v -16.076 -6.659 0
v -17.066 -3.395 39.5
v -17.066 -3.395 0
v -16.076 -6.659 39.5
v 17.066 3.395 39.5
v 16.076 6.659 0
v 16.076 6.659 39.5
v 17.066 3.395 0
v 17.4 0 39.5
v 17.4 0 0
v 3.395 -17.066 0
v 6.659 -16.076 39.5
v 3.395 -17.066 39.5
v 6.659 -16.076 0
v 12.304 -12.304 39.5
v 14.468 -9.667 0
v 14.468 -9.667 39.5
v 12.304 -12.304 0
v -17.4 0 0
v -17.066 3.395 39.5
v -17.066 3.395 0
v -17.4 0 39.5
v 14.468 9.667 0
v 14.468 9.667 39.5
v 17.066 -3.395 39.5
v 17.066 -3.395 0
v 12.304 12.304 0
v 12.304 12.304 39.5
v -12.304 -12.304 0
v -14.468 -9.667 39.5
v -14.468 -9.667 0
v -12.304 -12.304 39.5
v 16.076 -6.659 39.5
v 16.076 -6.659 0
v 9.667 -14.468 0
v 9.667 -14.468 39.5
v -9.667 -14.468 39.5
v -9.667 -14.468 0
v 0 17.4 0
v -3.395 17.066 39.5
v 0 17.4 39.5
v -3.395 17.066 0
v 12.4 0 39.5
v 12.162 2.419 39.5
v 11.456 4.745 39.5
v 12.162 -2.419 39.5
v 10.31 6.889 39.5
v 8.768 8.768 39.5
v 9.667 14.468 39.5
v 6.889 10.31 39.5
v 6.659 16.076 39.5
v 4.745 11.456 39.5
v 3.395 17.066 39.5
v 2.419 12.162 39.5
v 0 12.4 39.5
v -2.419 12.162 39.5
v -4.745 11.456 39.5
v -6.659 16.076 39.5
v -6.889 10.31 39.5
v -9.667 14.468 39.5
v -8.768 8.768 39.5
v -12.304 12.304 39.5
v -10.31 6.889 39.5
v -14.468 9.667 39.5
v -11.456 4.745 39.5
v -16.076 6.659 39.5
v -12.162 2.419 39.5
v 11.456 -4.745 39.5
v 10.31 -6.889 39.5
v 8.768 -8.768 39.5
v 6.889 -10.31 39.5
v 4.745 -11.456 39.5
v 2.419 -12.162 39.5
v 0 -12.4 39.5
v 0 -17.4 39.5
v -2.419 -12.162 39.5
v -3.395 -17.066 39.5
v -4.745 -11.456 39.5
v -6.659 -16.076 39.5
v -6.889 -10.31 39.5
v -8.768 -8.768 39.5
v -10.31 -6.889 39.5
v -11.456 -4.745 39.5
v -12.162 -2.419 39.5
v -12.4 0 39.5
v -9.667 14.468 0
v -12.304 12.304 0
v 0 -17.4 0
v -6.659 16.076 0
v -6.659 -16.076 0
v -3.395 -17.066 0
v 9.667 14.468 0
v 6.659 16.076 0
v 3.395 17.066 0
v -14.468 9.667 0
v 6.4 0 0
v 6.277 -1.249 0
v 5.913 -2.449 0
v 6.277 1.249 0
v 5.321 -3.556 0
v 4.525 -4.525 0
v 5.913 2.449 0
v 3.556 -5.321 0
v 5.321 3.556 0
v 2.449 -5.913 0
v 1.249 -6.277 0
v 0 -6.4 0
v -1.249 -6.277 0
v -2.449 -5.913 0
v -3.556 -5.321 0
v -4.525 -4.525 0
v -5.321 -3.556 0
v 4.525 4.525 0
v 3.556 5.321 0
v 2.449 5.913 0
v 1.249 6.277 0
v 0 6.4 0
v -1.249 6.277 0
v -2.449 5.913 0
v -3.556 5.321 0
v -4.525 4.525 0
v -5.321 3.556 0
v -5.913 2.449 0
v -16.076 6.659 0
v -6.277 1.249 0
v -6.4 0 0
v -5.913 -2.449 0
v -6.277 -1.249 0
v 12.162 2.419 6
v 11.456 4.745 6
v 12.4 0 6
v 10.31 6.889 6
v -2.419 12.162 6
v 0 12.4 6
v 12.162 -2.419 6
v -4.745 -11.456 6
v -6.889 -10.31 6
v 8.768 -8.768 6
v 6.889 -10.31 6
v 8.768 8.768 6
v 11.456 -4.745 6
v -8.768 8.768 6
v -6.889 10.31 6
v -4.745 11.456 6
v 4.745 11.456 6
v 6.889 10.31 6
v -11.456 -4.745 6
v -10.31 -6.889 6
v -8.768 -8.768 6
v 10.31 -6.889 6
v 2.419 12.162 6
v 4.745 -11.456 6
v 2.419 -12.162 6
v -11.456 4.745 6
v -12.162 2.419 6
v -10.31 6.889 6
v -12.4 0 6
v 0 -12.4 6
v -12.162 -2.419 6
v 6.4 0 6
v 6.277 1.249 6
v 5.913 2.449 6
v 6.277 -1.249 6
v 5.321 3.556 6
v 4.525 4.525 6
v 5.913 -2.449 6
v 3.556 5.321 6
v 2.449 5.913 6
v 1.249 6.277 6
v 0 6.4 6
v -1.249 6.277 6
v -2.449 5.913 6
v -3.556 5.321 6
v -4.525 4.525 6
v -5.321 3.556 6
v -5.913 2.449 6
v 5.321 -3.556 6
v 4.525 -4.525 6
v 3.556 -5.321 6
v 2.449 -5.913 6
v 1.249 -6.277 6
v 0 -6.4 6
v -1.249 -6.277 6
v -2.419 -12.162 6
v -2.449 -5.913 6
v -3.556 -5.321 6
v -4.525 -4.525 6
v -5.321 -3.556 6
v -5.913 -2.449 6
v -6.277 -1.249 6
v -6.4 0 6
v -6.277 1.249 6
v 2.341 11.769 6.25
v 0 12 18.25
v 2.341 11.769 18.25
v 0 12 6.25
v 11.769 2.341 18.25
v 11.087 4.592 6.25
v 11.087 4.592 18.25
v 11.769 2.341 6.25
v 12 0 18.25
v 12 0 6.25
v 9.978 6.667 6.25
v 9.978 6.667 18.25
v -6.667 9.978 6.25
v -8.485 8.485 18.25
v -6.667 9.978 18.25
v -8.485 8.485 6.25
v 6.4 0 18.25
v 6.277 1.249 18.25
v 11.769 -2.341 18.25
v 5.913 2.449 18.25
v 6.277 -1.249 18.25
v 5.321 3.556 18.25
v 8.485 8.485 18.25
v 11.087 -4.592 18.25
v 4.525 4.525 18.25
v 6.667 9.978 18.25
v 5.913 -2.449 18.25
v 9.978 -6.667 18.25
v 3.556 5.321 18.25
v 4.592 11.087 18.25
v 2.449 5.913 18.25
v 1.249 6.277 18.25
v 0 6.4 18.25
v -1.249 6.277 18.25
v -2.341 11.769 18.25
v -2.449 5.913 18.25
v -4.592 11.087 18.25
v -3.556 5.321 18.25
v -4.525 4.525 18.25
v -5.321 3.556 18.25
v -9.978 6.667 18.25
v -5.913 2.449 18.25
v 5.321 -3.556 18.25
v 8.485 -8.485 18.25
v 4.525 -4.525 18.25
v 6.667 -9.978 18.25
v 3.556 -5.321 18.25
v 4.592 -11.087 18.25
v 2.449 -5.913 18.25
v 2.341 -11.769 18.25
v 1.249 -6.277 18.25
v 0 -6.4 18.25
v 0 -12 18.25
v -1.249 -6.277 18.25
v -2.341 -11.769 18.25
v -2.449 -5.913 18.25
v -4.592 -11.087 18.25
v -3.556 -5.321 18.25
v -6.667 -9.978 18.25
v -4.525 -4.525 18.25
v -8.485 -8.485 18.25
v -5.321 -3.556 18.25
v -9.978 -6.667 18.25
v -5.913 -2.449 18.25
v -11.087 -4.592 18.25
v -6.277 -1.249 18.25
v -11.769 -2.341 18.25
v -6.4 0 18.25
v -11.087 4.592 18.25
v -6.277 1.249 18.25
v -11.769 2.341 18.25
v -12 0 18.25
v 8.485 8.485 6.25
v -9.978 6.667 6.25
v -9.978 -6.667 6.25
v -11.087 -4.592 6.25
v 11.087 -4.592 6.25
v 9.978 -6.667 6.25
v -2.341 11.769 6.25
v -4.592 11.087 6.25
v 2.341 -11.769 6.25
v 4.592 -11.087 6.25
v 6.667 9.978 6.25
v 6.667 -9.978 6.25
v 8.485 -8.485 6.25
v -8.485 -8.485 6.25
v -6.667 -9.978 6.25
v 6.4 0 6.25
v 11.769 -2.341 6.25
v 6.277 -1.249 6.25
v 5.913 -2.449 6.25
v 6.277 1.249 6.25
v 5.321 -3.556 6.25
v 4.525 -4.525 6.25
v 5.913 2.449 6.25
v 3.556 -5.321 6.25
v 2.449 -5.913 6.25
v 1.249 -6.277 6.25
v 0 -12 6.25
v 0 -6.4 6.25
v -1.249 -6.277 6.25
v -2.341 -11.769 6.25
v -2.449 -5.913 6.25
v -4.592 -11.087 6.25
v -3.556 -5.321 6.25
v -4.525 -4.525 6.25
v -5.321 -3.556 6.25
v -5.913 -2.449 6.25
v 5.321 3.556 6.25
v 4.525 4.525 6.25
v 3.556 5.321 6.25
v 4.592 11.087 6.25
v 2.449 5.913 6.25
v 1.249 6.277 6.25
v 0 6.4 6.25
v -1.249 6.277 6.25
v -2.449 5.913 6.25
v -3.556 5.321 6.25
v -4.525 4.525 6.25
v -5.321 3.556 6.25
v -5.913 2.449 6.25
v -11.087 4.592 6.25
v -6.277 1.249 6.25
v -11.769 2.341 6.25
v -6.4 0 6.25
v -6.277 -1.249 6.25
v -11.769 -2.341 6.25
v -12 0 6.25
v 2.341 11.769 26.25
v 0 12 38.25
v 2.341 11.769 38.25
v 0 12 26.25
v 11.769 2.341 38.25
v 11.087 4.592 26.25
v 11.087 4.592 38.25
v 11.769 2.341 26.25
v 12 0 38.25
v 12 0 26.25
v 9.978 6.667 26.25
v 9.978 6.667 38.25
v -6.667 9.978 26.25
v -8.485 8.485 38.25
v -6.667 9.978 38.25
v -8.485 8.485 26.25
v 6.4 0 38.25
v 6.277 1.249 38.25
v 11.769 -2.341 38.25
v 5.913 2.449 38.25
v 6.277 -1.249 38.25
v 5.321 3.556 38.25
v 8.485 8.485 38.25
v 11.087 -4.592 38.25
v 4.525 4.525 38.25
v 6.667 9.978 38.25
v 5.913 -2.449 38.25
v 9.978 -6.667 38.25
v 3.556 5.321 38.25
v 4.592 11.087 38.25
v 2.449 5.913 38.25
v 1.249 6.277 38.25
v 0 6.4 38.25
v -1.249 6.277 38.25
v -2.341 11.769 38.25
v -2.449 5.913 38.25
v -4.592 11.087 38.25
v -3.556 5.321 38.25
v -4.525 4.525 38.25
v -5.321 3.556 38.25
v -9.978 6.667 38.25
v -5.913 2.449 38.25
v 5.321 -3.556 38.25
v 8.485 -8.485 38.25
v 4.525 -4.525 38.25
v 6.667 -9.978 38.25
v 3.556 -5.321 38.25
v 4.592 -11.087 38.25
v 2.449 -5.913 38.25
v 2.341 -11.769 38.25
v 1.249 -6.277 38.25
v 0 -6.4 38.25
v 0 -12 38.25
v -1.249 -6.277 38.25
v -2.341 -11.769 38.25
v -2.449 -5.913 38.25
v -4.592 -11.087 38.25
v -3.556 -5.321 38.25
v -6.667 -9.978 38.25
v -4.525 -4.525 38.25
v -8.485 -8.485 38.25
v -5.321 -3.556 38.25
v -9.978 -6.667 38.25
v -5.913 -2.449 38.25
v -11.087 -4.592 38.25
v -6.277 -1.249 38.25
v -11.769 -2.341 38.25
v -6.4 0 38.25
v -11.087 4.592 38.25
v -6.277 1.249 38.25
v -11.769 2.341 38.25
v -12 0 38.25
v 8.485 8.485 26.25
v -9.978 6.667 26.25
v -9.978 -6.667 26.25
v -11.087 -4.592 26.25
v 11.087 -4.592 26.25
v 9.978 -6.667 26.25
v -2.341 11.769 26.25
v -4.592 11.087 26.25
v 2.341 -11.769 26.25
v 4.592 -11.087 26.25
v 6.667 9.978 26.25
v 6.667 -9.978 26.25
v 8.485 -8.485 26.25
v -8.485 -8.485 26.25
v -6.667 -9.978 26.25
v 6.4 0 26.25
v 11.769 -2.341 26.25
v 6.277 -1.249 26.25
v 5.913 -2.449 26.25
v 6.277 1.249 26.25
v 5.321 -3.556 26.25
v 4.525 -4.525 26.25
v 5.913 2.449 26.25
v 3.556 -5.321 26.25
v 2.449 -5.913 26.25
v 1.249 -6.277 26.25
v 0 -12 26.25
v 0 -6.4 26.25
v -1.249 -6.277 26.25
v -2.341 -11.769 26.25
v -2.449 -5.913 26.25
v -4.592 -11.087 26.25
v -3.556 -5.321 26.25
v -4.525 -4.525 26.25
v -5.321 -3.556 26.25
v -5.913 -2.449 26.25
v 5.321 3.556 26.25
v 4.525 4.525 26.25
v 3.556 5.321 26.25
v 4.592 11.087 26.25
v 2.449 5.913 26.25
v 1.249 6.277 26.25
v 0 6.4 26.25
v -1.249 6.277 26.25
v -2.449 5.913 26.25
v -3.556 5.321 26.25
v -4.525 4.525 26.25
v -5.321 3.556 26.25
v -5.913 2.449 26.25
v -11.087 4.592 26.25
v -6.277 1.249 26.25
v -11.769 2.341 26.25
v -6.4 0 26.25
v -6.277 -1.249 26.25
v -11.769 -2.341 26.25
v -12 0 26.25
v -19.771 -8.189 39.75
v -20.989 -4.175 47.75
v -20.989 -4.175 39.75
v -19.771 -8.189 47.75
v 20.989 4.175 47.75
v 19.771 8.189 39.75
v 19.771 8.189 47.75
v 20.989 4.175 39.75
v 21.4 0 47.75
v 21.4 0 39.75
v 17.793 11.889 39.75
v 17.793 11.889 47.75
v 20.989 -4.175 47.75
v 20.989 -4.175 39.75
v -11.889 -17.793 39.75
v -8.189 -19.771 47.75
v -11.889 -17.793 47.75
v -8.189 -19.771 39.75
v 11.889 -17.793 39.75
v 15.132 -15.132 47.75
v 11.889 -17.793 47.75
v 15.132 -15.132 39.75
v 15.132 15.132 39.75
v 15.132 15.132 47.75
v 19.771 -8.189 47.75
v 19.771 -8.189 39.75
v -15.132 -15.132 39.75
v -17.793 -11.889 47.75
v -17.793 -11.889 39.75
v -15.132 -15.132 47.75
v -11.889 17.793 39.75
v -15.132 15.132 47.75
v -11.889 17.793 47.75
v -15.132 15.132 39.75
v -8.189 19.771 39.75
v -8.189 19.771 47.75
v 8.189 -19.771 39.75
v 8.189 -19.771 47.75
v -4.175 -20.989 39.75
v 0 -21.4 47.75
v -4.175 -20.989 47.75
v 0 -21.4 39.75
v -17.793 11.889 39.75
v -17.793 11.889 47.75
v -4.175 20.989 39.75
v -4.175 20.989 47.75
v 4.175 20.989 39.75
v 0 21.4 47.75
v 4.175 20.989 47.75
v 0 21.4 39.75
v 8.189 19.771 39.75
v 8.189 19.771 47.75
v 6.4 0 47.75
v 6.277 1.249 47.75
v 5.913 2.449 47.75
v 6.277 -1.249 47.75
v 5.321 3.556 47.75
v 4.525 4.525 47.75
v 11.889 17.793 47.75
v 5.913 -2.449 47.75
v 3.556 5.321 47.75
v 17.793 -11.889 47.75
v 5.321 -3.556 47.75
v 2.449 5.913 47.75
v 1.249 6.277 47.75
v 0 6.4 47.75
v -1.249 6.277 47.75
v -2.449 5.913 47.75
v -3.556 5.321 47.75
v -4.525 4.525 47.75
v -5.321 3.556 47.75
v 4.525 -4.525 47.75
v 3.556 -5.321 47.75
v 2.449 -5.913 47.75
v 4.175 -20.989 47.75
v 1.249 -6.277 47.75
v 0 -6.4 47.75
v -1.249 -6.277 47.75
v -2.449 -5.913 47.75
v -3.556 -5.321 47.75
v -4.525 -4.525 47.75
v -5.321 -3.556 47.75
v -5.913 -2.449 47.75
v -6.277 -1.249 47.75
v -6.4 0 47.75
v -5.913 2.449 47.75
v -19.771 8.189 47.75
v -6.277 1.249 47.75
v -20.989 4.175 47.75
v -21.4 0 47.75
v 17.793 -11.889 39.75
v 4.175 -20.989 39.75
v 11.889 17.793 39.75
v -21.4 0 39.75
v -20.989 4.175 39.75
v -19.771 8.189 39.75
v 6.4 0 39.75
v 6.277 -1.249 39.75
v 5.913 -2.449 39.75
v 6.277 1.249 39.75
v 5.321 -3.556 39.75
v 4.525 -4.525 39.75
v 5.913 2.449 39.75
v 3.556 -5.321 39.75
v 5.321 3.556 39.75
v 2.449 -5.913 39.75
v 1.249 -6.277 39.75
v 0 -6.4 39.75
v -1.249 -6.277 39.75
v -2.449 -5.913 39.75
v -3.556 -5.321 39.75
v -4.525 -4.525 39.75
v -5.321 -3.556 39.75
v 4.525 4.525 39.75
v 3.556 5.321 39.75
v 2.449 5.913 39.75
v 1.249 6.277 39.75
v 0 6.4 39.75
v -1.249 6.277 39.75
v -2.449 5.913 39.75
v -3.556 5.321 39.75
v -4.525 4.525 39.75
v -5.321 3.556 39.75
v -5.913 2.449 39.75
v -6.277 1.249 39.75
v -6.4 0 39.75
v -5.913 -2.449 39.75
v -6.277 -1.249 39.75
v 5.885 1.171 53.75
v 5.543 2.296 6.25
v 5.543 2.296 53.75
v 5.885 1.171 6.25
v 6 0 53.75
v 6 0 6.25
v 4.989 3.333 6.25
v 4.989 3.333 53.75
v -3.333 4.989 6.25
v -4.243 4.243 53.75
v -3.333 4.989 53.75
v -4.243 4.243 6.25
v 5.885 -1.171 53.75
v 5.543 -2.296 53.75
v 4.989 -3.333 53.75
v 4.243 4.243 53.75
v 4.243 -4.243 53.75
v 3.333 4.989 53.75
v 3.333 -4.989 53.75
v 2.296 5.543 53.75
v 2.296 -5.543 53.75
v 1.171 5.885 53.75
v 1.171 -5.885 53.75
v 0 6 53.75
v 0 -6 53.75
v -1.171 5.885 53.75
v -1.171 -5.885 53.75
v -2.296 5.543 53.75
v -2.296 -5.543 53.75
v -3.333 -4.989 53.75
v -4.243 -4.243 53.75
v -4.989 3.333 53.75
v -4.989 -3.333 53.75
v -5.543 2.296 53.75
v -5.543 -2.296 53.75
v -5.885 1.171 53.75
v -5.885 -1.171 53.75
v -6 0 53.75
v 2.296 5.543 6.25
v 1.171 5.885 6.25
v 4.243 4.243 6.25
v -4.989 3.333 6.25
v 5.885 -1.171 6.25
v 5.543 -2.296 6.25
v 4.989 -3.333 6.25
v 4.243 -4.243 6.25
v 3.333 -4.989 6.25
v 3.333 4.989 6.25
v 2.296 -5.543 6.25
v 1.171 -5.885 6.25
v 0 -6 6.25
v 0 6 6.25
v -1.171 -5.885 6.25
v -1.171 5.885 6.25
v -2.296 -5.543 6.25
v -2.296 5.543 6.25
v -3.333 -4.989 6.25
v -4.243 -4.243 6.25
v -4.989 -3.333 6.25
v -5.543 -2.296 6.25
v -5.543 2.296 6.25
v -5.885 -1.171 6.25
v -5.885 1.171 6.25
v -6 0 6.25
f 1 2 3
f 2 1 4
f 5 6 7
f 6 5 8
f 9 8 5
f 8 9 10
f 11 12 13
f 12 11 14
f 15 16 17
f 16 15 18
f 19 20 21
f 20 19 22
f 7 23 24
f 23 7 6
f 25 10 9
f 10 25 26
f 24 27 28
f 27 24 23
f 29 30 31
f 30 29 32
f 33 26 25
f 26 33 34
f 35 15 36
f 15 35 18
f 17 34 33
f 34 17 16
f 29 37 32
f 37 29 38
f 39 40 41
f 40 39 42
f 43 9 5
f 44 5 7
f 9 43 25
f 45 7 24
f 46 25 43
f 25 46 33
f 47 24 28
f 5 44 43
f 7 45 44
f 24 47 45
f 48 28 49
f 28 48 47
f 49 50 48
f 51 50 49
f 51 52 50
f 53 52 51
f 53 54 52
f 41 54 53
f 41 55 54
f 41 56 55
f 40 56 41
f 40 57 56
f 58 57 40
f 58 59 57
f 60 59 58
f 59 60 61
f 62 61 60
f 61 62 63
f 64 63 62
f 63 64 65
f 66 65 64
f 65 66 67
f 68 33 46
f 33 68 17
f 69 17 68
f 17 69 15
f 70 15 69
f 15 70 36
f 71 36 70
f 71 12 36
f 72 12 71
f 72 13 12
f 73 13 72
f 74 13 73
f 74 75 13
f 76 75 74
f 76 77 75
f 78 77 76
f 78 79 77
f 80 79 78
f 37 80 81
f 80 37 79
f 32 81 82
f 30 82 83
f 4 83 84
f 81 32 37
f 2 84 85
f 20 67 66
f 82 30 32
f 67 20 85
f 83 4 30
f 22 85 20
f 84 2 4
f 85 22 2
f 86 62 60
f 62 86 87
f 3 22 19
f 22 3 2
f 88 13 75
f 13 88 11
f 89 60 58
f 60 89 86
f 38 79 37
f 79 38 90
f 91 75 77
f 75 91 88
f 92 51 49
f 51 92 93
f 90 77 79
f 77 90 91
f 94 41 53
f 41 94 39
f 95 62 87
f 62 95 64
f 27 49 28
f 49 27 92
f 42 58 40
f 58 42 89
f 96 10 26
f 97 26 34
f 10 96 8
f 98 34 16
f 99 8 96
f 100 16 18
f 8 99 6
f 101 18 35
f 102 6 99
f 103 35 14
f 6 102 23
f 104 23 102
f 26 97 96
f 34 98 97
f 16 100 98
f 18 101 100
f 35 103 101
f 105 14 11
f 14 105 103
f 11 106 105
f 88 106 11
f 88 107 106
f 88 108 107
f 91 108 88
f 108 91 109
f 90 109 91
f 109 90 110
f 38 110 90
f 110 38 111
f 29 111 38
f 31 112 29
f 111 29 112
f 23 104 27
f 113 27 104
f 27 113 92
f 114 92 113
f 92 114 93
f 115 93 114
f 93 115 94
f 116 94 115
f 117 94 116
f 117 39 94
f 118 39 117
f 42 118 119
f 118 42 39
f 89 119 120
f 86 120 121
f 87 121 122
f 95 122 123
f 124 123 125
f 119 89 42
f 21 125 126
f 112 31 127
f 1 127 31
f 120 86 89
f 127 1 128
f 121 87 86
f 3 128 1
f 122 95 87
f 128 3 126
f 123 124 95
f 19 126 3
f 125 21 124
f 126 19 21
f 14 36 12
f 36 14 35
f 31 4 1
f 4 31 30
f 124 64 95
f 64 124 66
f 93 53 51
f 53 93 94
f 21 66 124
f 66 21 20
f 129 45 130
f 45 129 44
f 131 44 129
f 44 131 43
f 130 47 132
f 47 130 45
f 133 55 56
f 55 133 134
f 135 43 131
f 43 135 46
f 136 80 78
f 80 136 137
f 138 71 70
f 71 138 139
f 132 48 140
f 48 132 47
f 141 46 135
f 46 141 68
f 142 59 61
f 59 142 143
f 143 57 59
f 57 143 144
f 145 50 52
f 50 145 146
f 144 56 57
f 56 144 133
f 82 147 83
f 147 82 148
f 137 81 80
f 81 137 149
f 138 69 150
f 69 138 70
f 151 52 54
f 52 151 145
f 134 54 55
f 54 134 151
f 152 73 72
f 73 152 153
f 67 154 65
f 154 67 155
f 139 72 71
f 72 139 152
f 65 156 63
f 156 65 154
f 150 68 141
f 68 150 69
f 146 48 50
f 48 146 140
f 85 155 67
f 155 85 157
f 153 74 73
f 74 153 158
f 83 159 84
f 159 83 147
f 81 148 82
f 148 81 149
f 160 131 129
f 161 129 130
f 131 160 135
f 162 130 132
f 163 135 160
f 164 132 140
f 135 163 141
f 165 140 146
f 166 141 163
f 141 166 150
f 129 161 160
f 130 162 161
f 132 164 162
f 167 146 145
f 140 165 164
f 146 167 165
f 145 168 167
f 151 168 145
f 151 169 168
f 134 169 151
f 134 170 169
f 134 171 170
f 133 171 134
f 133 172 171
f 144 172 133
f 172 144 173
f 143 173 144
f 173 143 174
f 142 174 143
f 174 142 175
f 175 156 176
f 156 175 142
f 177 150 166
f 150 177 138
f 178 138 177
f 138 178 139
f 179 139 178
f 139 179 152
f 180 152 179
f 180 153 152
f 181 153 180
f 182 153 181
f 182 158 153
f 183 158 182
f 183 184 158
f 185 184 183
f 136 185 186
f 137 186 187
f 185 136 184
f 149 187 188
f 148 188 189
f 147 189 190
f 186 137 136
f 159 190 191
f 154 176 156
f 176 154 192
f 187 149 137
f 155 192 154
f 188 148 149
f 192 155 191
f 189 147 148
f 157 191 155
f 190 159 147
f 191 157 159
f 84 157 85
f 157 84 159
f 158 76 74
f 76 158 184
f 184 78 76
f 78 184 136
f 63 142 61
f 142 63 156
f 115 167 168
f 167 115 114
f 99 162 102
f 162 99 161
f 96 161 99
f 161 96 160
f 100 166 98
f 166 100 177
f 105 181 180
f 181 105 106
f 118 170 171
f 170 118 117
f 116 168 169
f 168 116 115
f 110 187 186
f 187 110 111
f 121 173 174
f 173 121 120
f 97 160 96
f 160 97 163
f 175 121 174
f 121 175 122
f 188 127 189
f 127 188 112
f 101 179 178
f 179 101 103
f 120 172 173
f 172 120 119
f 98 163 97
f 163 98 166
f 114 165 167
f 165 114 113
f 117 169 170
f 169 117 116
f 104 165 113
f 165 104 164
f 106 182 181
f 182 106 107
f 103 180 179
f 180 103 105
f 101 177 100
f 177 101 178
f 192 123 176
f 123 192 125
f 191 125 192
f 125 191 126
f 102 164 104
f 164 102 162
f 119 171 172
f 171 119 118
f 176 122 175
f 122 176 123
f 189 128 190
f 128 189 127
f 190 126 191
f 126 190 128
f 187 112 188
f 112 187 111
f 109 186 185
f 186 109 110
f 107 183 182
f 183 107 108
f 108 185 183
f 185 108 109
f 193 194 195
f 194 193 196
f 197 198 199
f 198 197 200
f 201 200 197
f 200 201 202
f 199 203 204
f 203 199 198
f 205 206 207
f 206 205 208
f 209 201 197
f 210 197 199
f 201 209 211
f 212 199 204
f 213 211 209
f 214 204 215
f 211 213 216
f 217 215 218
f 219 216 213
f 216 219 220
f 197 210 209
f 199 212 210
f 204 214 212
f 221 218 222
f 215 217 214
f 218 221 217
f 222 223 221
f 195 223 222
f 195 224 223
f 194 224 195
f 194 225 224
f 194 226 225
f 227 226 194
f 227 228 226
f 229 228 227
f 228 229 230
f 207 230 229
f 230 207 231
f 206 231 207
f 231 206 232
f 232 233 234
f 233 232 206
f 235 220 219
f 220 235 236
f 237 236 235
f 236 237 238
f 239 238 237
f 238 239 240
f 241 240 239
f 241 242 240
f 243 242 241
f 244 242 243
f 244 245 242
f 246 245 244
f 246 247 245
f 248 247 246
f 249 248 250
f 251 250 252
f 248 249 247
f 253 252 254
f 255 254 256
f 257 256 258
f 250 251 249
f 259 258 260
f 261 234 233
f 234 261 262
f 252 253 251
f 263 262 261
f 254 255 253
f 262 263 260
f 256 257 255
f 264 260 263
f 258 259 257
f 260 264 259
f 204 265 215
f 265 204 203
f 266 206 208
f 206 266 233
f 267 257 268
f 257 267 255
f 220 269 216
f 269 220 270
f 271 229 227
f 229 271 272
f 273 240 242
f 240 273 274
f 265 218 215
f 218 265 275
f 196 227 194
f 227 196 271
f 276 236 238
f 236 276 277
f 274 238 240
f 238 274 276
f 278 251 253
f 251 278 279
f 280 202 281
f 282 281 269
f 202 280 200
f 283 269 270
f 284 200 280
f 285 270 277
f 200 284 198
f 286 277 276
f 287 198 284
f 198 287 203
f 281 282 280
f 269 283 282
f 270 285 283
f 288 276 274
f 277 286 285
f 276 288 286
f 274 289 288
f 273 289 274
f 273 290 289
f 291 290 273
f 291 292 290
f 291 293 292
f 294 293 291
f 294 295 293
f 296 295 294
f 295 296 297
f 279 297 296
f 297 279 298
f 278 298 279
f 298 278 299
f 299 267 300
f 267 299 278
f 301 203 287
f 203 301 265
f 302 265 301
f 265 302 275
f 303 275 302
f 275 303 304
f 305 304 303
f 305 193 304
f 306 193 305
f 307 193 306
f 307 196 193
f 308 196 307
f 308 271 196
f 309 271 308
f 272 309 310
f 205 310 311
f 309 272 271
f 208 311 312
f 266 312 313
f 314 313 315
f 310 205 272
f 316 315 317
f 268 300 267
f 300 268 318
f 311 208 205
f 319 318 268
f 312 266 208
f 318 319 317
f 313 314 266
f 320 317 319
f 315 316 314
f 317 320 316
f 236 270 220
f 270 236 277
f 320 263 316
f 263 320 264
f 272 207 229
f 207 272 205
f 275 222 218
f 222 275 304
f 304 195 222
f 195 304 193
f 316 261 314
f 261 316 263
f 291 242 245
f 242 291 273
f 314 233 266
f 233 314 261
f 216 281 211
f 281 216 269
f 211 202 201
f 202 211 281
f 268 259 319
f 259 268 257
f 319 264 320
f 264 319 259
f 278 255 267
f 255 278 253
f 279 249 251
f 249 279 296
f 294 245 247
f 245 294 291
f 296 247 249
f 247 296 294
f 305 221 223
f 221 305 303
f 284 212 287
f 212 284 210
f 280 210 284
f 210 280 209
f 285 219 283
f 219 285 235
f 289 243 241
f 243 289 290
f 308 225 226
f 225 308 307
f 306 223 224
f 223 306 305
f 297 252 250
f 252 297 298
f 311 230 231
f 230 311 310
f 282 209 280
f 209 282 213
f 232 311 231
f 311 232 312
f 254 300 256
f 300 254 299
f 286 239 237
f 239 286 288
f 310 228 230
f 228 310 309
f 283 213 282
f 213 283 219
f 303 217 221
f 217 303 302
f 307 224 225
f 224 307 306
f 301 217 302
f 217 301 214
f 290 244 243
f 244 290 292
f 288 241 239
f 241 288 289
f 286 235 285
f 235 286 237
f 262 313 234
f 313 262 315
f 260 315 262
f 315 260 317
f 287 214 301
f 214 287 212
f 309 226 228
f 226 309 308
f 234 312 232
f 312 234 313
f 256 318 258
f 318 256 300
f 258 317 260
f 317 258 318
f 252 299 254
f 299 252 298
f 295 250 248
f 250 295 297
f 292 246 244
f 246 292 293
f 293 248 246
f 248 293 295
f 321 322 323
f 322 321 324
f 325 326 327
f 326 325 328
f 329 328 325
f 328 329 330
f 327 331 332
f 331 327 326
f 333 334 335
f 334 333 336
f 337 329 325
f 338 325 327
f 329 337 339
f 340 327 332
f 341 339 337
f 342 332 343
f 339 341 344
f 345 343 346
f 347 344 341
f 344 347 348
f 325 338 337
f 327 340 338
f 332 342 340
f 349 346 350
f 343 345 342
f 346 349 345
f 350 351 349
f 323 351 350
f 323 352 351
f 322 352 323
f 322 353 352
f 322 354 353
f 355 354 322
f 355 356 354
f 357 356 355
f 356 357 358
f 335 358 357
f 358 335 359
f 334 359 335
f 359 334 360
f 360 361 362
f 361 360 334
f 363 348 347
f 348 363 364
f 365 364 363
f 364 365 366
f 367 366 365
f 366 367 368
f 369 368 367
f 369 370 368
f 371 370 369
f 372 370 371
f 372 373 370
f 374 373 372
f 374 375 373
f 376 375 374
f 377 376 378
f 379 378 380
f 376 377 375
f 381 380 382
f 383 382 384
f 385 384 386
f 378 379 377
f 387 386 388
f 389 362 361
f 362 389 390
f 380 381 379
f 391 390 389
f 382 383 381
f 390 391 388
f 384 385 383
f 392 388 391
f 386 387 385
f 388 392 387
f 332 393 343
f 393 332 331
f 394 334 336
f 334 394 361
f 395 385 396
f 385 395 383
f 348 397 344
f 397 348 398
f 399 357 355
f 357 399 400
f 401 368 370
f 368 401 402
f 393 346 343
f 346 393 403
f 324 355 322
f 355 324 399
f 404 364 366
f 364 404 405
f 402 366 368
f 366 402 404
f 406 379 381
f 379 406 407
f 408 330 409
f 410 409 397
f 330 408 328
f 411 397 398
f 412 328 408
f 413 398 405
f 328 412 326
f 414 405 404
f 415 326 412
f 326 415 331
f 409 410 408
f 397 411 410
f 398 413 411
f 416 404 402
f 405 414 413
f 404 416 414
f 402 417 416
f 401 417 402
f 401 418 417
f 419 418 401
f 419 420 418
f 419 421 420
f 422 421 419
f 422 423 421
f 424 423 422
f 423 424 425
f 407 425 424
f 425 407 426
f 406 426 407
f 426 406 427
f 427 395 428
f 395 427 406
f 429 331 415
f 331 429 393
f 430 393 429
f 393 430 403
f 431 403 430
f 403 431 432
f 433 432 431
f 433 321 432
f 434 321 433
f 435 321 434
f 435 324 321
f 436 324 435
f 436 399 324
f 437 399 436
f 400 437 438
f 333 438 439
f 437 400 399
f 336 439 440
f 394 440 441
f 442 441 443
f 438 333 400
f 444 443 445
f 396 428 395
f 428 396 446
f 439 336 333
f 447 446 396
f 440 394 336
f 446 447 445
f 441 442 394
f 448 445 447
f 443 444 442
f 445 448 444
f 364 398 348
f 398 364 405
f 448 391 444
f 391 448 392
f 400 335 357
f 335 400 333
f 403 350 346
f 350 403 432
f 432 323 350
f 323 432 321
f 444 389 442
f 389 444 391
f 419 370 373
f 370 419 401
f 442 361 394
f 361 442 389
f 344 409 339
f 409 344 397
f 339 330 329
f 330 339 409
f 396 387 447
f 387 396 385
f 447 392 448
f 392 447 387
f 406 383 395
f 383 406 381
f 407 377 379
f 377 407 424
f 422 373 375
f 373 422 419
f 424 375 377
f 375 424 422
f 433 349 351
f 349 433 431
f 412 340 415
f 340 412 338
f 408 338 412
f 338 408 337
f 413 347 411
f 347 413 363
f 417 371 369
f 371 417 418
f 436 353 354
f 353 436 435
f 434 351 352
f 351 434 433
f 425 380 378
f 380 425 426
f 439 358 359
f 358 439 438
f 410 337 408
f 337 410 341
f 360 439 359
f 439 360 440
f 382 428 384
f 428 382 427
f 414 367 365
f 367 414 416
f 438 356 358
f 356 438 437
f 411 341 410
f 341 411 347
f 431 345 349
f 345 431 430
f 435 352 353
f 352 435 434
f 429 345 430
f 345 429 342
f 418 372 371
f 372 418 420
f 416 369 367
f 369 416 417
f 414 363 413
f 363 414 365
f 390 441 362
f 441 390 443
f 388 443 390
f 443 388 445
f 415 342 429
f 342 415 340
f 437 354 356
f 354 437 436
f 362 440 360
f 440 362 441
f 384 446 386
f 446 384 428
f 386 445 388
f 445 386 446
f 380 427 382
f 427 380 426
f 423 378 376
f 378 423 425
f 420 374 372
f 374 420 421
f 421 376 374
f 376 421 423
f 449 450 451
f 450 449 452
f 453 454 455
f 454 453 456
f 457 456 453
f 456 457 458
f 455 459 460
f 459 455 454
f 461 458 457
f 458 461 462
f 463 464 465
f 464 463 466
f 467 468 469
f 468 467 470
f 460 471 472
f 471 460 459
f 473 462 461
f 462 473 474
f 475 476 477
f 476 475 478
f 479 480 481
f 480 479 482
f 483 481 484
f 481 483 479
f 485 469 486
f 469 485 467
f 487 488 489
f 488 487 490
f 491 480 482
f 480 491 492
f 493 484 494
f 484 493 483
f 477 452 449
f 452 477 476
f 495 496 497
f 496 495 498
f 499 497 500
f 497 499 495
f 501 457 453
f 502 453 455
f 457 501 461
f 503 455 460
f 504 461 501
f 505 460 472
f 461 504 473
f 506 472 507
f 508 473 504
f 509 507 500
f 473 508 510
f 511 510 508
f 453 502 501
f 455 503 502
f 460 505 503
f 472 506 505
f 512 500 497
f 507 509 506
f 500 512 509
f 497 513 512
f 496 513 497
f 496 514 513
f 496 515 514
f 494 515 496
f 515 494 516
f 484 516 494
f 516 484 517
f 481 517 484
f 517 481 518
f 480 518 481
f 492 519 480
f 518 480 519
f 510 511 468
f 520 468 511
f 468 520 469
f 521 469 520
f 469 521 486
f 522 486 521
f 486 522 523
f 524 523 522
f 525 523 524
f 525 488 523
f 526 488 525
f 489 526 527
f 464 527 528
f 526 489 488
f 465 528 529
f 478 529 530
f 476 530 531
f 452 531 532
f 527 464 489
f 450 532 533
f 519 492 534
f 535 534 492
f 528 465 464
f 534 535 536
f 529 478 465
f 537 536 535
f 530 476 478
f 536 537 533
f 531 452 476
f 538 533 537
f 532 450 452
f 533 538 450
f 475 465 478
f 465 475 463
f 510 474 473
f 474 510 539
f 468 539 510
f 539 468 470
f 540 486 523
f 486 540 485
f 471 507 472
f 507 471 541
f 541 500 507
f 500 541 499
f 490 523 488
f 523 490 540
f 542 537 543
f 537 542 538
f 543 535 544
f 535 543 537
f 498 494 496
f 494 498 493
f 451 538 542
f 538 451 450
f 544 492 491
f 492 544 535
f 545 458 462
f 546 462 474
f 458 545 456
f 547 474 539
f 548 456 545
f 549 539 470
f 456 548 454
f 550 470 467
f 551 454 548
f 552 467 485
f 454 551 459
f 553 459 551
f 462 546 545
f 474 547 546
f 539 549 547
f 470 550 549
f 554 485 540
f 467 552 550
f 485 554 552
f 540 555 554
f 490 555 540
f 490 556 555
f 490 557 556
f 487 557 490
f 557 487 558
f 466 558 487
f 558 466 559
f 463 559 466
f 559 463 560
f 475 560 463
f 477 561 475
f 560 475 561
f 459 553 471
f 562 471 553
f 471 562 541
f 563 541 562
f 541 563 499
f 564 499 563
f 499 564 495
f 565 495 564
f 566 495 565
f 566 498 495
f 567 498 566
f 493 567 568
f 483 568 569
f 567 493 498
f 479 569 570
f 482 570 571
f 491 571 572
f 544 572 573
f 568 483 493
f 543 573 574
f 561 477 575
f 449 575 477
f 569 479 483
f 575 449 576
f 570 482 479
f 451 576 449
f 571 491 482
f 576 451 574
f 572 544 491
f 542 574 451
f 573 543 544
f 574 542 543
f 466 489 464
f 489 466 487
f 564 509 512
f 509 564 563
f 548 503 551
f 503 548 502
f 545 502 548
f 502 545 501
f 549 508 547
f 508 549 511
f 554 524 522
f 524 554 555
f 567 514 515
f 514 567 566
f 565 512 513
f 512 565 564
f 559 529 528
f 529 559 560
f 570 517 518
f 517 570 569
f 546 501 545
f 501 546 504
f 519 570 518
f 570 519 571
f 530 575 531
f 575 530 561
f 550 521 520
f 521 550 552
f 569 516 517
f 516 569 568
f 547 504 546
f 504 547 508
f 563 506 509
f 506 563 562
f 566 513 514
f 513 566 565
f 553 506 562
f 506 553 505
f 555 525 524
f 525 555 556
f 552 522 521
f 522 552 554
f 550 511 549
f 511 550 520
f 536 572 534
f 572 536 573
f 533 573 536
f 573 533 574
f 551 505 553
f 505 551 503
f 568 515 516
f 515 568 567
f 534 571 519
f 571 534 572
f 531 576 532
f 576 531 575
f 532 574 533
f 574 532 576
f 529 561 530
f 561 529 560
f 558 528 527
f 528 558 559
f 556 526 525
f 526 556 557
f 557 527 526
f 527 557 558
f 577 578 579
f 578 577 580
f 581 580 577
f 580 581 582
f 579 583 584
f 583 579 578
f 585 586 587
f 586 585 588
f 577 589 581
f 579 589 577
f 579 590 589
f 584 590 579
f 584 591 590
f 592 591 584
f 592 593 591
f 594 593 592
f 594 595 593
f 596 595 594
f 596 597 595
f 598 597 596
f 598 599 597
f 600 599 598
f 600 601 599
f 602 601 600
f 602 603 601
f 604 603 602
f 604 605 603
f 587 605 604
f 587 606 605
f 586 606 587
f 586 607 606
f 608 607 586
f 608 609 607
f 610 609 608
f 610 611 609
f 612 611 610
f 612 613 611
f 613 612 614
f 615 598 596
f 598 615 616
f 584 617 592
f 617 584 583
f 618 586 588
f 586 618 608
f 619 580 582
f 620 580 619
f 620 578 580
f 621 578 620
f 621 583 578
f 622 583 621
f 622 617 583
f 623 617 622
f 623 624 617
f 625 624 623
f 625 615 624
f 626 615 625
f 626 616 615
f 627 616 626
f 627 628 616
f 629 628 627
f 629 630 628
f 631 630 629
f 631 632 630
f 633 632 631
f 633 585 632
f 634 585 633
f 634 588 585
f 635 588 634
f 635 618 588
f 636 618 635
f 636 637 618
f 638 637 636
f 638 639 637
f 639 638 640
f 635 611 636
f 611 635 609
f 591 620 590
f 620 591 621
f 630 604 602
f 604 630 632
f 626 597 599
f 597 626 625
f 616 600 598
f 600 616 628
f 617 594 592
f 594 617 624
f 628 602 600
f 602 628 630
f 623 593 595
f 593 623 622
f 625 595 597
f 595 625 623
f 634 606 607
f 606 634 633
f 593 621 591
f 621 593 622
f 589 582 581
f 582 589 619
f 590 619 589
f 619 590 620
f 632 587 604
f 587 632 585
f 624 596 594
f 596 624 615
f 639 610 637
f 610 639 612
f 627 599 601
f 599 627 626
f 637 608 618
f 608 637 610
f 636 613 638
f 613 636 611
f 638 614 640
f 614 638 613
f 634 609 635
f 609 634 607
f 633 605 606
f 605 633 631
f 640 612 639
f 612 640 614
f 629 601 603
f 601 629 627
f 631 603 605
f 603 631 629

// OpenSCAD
$fn = 32;

// ------------------------------------------------------------------------
// Shaft station: cup d34.8 x 39.5 mm, shaft d12
// Every part is its own module, assembly() places every instance.
// ------------------------------------------------------------------------

// --- part 1 ---
module housing_cup() {
  difference() {
    cylinder(h = 39.5, d = 34.8);
    translate([0, 0, 6]) cylinder(h = 34.5, d = 24.8);
    translate([0, 0, -1]) cylinder(h = 8, d = 12.8);
  }
}

// --- part 2 ---
module bearing_lower() {
  difference() {
      translate([0, 0, 0]) cylinder(h = 12, d = 24);
      translate([0, 0, -1]) cylinder(h = 14, d = 12.8);
    }
}

// --- part 3 ---
module bearing_upper() {
  difference() {
      translate([0, 0, 0]) cylinder(h = 12, d = 24);
      translate([0, 0, -1]) cylinder(h = 14, d = 12.8);
    }
}

// --- part 4 ---
module station_shaft() {
  translate([0, 0, -23.75]) cylinder(h = 47.5, d = 12);
}

// --- part 5 ---
module station_cover() {
  difference() {
    cylinder(h = 8, d = 42.8);
    translate([0, 0, -1]) cylinder(h = 10, d = 12.8);
  }
}

// --- assembly ---
module assembly() {
  color([0.80, 0.24, 0.20]) translate([0, 0, 0]) rotate([0, 0, 0]) housing_cup();
  color([0.20, 0.45, 0.75]) translate([0, 0, 6.25]) rotate([0, 0, 0]) bearing_lower();
  color([0.25, 0.62, 0.32]) translate([0, 0, 26.25]) rotate([0, 0, 0]) bearing_upper();
  color([0.92, 0.70, 0.18]) translate([0, 0, 30]) rotate([0, 0, 0]) station_shaft();
  color([0.58, 0.35, 0.70]) translate([0, 0, 39.75]) rotate([0, 0, 0]) station_cover();
}

assembly();
